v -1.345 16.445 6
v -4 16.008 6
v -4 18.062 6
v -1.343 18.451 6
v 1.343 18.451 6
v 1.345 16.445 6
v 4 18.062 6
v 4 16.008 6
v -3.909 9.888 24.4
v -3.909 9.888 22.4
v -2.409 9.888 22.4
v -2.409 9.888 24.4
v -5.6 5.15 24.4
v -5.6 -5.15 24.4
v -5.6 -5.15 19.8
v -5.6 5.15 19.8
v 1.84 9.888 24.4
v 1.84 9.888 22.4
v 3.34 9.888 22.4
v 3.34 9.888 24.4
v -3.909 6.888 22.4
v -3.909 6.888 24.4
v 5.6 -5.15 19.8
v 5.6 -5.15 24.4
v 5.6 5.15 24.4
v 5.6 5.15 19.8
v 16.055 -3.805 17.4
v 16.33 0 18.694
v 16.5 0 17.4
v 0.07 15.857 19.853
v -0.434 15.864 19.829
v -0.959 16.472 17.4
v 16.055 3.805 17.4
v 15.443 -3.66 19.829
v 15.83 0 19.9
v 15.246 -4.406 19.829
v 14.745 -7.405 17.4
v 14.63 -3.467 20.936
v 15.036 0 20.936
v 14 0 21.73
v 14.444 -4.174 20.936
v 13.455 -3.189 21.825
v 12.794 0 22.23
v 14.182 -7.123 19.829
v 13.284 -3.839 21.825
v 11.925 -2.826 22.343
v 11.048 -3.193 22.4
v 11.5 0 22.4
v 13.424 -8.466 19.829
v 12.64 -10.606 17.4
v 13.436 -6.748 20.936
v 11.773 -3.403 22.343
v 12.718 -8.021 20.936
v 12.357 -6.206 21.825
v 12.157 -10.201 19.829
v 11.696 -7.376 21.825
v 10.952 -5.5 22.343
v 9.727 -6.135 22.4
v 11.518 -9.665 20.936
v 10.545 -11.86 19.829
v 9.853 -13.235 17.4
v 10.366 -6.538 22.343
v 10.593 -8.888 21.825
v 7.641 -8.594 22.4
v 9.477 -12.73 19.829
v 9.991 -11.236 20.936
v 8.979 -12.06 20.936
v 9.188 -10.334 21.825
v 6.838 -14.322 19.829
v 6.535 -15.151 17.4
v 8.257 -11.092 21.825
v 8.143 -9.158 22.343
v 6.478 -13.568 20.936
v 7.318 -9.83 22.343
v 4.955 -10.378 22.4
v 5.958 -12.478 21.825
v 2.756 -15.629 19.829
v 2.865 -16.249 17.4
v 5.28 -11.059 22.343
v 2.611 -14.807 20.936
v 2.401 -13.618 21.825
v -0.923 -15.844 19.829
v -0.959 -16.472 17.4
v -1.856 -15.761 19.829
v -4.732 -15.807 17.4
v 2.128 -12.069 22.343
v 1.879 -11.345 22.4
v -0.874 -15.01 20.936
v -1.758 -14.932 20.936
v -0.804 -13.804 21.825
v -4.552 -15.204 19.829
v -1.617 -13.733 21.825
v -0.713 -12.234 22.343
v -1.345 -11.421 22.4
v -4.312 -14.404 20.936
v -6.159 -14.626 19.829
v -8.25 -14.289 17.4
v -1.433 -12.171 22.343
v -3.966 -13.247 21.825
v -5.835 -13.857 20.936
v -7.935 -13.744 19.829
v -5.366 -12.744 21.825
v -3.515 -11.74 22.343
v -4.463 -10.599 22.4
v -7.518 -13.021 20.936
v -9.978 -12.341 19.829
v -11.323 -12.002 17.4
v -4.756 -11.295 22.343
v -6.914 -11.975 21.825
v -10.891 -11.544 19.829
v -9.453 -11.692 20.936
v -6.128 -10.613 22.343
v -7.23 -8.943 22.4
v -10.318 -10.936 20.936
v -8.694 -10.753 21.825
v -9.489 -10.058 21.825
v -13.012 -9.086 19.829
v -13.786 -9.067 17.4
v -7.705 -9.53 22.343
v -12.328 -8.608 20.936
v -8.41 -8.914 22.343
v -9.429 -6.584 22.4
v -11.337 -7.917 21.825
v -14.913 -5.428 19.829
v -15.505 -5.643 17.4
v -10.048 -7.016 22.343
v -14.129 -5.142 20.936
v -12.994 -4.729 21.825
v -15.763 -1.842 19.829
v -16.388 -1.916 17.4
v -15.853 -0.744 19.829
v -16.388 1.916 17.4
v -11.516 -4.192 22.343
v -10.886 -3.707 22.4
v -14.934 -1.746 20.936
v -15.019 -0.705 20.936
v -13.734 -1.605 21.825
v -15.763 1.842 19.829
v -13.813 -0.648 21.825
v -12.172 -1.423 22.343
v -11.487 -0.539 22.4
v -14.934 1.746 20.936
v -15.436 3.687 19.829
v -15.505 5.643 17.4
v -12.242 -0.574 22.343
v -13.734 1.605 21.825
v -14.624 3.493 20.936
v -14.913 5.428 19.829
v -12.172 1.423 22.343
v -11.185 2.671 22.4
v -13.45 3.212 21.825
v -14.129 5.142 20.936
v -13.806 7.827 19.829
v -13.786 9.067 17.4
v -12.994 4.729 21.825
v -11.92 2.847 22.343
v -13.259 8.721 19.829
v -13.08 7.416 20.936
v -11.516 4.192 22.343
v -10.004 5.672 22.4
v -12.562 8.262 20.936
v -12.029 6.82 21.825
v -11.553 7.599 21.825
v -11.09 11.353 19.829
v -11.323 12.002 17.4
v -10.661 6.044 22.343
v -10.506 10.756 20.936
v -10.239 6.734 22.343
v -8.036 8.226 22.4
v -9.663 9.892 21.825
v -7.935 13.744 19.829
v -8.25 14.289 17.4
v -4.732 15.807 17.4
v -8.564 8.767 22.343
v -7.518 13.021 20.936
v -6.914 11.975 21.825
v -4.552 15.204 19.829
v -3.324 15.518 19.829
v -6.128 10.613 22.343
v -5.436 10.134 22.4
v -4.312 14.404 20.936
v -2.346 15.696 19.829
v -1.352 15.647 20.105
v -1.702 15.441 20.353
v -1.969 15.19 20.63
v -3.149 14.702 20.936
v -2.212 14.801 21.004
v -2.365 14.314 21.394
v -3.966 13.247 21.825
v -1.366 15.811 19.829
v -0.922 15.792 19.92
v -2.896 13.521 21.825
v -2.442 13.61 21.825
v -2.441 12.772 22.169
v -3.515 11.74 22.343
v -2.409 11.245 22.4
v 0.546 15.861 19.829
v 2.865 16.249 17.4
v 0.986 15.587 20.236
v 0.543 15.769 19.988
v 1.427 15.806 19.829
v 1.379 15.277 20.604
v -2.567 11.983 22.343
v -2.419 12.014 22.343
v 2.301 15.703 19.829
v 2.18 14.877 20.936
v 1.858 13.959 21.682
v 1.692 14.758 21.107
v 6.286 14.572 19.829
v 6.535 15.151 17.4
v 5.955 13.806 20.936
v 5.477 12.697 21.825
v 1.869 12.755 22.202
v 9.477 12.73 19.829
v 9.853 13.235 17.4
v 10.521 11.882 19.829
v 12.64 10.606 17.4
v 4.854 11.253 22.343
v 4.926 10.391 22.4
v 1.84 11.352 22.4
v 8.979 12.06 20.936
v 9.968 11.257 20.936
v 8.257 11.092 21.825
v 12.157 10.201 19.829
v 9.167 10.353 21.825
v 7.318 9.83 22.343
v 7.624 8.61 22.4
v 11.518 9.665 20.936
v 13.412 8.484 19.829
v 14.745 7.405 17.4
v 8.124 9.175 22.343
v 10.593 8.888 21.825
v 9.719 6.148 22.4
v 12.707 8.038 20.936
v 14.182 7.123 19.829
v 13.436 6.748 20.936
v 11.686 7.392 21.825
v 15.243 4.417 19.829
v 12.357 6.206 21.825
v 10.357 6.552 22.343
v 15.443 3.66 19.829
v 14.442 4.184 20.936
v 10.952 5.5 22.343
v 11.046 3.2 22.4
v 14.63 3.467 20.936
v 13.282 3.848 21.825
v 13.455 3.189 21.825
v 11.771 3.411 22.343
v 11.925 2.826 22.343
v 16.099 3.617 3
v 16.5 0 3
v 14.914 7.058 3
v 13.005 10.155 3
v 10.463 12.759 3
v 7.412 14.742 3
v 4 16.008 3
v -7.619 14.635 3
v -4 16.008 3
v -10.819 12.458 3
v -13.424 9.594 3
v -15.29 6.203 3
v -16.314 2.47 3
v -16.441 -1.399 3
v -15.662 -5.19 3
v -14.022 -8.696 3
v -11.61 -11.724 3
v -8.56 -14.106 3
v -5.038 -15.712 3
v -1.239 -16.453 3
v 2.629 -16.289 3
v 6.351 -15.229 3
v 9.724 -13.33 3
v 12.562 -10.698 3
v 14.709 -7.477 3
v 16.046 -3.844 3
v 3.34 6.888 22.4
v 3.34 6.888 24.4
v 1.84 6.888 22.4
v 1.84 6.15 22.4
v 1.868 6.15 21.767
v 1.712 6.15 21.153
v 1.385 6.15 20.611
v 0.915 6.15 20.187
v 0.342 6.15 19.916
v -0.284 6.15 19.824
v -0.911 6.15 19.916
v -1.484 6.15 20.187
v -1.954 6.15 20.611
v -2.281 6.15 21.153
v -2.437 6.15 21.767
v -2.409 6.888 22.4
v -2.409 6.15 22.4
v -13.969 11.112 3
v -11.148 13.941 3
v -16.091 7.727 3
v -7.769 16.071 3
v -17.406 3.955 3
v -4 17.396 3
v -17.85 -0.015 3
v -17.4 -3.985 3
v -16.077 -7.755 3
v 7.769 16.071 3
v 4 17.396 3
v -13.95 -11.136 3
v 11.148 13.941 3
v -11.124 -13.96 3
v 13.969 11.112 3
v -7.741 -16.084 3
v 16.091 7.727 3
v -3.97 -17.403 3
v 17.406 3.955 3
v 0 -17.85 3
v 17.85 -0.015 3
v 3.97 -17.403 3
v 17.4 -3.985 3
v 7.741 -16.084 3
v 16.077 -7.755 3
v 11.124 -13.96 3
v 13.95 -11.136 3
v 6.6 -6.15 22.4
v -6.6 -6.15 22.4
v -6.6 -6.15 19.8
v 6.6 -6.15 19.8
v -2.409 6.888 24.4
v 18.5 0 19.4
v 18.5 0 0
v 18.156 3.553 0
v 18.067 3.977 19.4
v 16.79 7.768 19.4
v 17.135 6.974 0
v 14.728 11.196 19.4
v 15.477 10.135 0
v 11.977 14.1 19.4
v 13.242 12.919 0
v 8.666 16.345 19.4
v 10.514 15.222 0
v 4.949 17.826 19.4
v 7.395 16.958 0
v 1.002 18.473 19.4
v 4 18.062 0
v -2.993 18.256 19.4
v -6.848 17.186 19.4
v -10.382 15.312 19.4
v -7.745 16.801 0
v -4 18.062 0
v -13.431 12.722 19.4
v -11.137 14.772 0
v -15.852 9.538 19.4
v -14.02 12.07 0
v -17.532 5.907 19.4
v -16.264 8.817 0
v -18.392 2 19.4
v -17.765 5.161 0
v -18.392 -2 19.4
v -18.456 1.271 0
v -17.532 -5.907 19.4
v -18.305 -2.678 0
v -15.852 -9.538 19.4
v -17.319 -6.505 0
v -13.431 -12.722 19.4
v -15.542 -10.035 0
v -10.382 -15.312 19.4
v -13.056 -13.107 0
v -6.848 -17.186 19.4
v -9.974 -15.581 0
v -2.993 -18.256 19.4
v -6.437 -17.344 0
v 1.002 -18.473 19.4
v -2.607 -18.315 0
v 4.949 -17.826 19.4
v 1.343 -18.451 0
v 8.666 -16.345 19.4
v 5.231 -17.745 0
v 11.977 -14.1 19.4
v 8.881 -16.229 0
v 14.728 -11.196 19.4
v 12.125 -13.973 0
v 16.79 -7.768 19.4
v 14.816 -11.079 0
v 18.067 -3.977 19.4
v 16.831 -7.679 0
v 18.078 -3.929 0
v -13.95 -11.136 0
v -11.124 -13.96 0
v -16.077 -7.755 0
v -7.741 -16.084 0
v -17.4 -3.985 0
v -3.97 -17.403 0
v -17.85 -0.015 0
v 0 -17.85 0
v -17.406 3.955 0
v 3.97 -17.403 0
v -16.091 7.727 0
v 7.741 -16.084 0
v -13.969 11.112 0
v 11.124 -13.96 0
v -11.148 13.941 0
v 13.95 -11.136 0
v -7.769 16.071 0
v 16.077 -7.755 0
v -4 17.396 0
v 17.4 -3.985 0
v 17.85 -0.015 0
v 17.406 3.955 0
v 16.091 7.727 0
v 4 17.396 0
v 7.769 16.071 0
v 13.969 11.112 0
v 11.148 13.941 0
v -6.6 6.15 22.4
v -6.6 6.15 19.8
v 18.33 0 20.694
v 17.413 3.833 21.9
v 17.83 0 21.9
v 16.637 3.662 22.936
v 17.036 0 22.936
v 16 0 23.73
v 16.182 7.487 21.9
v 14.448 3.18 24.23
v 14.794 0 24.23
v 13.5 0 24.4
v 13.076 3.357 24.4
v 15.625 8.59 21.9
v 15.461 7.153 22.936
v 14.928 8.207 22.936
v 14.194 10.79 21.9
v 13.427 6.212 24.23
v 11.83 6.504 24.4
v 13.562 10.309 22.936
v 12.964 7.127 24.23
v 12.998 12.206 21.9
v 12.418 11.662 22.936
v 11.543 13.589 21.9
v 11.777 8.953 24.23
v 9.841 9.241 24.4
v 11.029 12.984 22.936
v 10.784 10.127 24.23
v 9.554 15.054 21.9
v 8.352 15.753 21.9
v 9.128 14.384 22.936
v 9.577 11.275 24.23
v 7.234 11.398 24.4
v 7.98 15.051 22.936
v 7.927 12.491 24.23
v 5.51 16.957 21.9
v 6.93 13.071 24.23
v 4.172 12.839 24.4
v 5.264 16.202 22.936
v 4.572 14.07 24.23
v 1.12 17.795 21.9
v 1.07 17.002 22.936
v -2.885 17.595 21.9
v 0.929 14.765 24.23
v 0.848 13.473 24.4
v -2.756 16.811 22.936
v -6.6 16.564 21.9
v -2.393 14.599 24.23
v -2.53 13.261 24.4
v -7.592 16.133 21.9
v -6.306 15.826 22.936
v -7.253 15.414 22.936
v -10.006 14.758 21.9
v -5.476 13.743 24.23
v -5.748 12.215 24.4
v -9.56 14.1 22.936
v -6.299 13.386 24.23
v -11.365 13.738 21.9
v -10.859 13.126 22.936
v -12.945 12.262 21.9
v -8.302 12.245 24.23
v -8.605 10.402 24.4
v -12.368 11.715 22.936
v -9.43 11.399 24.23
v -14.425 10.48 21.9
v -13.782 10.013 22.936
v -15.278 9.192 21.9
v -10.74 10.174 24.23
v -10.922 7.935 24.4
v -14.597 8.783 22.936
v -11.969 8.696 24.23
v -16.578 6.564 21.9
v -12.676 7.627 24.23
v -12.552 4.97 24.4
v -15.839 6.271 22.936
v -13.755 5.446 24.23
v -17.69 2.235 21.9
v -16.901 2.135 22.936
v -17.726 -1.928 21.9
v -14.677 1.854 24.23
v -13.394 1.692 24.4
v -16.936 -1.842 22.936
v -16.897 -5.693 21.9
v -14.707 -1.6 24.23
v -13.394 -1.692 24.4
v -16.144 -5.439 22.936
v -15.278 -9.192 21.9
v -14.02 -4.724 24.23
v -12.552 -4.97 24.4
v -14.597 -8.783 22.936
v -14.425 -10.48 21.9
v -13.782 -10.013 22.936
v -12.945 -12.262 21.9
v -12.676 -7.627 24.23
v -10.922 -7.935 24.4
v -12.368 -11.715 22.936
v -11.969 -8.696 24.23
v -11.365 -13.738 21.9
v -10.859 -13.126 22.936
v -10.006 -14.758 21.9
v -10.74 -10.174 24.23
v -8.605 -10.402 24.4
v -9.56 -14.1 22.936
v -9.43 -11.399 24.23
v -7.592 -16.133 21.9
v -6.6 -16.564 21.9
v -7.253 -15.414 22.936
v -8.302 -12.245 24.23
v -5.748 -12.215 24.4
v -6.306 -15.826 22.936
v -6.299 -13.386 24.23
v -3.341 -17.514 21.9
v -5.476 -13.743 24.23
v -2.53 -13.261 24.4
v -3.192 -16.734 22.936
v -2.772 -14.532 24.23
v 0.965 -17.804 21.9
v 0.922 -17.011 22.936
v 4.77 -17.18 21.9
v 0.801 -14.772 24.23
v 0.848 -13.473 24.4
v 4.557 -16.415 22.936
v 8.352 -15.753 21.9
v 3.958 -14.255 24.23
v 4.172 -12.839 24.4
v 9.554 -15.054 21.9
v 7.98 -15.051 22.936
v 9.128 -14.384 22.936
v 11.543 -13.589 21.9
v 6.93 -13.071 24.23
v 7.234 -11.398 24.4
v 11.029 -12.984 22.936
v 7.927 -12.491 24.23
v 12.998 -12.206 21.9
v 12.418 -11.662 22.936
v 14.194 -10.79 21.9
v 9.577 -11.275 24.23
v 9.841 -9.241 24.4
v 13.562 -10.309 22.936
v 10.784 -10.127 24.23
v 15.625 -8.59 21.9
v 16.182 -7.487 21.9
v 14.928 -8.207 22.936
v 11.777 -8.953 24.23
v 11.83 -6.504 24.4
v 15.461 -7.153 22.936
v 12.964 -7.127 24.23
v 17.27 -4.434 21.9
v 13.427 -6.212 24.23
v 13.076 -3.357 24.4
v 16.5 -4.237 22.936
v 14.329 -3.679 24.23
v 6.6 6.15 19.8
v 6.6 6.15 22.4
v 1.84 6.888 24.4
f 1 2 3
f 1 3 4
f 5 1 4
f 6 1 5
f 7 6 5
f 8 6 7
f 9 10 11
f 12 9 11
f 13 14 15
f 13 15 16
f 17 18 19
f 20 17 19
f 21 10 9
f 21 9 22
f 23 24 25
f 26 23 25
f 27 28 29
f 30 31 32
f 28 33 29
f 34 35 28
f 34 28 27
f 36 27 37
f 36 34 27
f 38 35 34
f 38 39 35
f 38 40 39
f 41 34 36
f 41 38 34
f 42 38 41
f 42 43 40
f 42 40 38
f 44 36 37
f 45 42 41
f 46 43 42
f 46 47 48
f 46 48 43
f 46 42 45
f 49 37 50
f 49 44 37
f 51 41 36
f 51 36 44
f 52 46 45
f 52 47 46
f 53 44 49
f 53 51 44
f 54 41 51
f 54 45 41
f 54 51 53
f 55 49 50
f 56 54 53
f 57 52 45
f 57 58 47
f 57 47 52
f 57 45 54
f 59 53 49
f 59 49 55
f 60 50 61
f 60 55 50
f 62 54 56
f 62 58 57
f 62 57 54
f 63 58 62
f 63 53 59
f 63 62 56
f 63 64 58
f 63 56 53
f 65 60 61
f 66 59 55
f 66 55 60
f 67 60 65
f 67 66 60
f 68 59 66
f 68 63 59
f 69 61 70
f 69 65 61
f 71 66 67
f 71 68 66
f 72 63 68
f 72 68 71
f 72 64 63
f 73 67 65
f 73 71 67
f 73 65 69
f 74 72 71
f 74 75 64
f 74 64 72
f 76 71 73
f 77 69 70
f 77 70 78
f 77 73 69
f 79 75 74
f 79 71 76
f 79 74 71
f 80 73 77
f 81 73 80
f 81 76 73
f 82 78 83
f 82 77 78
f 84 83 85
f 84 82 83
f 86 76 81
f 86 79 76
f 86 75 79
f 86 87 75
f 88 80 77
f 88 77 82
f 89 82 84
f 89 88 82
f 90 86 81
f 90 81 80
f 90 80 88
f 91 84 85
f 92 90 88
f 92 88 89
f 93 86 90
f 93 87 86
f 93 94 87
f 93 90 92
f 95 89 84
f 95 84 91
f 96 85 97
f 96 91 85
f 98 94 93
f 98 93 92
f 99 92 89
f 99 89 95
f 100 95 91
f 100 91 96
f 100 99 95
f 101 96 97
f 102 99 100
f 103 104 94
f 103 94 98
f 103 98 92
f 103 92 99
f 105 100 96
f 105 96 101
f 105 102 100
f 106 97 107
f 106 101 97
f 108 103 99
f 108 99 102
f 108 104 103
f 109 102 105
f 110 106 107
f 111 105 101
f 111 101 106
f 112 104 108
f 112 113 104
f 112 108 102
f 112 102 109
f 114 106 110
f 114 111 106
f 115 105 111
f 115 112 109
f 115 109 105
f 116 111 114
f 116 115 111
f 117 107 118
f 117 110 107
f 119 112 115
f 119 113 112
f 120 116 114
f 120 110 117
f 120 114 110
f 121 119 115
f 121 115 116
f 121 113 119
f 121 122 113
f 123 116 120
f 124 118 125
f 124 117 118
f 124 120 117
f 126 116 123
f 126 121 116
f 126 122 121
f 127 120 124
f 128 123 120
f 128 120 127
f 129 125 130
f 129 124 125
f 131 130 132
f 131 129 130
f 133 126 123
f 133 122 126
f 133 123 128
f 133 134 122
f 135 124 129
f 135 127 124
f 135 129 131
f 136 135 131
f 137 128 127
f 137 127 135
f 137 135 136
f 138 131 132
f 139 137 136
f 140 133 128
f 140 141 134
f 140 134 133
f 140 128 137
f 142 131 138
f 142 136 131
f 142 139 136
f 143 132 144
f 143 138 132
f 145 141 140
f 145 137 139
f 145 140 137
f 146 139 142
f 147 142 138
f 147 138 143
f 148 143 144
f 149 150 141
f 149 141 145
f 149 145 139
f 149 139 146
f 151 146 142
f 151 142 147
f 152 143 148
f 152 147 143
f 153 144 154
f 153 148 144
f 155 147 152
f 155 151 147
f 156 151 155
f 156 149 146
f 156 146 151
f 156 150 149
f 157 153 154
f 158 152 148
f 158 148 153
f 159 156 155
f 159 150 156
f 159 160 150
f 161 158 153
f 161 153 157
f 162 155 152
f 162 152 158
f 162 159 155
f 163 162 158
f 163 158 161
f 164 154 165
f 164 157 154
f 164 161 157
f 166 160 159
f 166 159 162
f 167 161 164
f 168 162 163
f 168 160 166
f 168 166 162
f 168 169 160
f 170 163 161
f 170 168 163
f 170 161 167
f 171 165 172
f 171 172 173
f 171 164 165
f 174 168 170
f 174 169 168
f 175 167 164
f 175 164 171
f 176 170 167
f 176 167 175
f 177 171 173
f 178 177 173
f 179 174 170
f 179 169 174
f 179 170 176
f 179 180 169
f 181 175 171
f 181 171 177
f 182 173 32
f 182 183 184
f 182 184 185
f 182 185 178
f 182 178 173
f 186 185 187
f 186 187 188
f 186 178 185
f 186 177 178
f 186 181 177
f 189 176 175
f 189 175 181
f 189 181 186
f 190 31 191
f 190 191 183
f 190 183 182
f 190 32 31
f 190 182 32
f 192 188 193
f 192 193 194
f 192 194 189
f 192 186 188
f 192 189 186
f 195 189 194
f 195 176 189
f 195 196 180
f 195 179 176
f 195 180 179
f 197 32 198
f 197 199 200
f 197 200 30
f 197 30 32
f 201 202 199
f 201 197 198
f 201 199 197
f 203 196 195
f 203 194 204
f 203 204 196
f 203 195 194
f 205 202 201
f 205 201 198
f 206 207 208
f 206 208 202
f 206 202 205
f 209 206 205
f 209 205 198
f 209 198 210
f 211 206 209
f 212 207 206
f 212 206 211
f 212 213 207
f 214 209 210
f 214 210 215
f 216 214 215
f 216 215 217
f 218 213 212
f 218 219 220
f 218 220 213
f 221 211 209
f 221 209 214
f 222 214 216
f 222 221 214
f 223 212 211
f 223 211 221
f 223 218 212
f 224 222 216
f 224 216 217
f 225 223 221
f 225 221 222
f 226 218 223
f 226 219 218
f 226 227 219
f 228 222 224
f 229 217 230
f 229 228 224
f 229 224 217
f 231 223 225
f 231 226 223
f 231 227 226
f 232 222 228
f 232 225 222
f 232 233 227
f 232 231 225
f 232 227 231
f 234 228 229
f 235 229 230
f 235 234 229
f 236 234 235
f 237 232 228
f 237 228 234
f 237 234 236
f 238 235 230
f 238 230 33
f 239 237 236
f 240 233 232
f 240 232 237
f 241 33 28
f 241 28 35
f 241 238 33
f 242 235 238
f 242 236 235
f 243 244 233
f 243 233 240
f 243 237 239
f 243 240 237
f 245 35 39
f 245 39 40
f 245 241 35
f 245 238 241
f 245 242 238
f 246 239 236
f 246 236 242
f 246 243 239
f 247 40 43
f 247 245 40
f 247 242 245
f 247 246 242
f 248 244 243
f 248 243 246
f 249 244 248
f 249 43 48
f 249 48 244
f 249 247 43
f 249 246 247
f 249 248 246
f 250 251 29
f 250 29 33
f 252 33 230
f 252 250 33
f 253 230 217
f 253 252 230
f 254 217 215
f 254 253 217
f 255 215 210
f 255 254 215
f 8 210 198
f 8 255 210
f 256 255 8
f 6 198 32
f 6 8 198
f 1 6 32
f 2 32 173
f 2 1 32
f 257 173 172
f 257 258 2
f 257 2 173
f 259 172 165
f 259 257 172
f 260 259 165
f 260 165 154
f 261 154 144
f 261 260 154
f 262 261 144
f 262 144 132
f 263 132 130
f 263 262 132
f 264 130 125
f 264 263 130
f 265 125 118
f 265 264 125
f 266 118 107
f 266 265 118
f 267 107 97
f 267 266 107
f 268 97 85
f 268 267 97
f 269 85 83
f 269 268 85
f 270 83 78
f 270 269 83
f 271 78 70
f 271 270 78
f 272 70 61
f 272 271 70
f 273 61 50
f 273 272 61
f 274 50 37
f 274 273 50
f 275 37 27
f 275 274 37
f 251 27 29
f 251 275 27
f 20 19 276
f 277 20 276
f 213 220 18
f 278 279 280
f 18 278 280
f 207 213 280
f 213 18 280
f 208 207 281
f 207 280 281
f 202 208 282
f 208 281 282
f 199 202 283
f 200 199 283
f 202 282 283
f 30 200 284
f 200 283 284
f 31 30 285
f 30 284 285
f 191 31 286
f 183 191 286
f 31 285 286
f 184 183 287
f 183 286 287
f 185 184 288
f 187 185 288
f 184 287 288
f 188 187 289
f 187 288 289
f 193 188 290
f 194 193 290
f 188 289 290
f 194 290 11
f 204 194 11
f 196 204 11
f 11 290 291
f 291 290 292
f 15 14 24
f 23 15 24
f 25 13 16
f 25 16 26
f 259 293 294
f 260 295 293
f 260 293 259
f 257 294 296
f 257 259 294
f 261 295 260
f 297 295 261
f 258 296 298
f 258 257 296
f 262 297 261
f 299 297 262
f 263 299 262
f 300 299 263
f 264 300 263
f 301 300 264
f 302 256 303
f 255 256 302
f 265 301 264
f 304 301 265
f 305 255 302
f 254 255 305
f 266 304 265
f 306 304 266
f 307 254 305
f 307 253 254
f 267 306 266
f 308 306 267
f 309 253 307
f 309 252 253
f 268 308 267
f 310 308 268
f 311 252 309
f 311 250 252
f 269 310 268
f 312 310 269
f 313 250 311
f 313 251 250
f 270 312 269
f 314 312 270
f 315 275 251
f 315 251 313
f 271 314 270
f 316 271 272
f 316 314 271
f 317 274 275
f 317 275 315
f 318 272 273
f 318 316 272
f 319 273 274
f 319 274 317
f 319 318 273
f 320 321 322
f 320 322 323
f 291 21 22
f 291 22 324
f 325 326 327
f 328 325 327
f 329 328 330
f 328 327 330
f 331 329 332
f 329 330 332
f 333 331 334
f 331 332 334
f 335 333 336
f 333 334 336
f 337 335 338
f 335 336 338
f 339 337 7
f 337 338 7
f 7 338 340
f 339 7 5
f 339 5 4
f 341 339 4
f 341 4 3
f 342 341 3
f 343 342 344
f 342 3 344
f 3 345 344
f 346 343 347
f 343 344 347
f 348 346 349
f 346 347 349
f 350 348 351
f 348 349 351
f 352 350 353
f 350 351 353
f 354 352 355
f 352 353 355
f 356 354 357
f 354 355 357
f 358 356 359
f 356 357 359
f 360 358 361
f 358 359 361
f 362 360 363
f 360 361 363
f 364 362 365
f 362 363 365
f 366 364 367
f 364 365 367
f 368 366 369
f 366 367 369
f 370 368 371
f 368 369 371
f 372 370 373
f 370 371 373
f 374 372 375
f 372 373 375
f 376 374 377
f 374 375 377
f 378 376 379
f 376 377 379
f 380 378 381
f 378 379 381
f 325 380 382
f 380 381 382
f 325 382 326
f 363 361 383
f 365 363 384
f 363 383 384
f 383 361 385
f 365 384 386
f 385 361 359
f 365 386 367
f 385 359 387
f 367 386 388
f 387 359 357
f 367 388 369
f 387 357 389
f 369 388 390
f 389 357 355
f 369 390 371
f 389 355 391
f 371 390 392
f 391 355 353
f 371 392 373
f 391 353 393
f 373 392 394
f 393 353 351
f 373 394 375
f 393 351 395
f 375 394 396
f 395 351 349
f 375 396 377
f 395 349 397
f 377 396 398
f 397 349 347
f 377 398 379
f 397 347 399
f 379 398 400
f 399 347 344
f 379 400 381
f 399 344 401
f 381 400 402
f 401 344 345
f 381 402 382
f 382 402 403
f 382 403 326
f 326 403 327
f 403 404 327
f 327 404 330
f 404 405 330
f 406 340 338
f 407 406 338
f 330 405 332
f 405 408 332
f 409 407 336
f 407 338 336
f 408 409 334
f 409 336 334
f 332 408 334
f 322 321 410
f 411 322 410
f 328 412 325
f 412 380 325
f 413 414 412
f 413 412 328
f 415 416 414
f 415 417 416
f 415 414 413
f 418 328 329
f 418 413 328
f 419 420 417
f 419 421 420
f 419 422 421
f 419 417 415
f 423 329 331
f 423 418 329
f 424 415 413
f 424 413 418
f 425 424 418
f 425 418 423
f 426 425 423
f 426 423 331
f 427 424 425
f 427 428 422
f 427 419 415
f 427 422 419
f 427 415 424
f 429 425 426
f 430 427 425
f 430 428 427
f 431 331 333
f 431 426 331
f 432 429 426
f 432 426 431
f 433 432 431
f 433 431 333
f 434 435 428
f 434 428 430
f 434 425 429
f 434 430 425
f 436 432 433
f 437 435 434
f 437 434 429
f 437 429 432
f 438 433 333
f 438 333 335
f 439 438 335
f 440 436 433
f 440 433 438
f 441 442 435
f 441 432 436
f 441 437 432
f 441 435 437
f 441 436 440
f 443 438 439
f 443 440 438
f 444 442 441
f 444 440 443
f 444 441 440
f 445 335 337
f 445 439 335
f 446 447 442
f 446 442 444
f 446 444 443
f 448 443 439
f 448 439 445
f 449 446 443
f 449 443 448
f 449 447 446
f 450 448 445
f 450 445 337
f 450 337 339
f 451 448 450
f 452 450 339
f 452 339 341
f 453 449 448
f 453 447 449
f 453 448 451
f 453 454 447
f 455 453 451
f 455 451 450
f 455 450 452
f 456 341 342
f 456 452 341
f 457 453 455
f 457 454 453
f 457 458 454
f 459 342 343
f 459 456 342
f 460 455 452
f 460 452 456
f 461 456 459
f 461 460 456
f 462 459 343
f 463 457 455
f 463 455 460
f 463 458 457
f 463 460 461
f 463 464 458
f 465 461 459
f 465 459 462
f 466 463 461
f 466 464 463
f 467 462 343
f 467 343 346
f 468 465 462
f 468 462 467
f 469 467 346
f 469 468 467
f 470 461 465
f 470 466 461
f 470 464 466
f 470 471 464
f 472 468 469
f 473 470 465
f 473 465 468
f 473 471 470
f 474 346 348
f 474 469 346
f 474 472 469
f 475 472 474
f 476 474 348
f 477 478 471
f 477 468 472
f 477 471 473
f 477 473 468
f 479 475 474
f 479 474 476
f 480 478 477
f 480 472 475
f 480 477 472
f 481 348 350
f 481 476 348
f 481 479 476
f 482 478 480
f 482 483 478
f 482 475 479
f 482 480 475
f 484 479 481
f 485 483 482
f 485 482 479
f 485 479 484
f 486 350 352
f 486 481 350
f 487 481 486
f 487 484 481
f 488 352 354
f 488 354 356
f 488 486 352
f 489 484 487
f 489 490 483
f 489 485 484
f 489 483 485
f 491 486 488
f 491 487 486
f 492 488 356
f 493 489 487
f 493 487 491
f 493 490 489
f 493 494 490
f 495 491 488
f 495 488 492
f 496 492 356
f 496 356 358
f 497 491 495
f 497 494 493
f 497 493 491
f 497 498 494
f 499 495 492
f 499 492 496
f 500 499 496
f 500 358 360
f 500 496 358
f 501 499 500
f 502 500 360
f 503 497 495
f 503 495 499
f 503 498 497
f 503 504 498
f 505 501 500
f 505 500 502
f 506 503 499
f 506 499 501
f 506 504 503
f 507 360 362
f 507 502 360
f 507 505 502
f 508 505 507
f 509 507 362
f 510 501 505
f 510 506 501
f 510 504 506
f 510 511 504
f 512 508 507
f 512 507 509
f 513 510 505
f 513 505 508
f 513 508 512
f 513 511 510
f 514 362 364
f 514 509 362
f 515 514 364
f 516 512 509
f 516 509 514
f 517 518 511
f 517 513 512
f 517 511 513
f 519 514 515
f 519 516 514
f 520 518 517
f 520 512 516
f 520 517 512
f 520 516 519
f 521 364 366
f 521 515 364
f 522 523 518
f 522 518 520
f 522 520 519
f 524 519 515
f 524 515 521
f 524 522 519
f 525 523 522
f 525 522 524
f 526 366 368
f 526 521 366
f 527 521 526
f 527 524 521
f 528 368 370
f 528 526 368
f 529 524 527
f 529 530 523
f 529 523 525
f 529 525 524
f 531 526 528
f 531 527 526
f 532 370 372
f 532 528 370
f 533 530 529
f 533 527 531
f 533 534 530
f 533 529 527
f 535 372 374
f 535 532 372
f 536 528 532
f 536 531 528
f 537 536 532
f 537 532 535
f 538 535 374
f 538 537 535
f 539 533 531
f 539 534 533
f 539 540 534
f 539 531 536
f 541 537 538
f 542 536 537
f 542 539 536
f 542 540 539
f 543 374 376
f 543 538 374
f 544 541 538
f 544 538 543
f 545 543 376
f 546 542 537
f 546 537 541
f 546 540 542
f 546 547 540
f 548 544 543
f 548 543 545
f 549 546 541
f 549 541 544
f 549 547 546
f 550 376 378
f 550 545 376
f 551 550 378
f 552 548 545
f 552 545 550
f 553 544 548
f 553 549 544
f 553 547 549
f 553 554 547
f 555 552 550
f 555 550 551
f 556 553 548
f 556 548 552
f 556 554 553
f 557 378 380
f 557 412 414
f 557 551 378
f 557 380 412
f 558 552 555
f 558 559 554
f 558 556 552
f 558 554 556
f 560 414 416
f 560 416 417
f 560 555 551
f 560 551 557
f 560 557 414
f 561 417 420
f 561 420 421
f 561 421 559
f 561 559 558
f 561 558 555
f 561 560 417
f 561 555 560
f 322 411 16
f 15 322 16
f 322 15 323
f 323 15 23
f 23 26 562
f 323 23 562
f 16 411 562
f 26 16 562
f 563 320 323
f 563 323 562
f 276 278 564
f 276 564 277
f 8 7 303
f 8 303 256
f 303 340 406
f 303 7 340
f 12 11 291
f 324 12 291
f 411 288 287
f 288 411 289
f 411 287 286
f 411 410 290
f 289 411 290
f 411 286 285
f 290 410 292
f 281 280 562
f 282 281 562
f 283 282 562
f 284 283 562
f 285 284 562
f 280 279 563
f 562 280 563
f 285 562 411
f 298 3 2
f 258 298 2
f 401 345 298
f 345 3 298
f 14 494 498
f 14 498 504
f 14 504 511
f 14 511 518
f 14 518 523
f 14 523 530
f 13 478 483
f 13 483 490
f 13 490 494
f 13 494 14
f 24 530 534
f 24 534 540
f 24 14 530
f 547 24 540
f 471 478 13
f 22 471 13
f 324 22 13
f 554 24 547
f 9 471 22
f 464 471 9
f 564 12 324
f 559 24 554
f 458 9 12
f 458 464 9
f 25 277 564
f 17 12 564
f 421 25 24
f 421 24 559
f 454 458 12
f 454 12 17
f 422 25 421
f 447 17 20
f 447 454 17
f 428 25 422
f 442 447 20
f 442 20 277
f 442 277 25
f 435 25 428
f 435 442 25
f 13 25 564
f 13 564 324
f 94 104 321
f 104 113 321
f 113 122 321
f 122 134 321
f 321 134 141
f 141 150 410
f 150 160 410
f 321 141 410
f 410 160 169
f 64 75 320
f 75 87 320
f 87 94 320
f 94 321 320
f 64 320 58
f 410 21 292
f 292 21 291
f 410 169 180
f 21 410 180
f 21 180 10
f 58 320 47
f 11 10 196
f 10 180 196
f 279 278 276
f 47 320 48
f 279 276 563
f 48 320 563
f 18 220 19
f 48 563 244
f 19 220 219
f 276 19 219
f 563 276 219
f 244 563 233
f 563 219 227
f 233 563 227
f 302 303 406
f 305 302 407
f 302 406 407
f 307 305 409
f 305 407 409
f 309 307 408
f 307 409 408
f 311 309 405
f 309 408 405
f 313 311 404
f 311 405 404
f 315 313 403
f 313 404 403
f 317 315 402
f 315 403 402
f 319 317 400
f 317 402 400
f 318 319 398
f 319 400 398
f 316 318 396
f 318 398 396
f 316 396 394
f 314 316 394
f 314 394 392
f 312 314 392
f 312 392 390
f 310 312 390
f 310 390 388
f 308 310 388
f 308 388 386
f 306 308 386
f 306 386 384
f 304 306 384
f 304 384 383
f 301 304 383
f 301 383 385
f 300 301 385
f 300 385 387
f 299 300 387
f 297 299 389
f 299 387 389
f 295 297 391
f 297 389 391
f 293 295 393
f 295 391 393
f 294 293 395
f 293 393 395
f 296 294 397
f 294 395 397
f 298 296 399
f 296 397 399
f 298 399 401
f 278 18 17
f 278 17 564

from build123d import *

# Parameters (mm, degrees)
F0_R      = 18.5
F1_DEPTH  = 24.4
F2_T      = -2
F3_R      = 5
F4_R      = 5
F5_W      = 11.2
F5_H      = 10.3
F6_DEPTH  = 25
F7_W      = 8
F7_H      = 32.8909642994
F8_DEPTH  = 6
F9_R      = 17.85
F10_DEPTH = 3
F5_W_2    = 13.2
F5_H_2    = 12.3
F11_DEPTH = 4.6
F13_DEPTH = 10
F14_W     = 1.5
F14_H     = 3
F15_DEPTH = 25


with BuildPart() as f1:
    # F0 (on Top) → F1 (new body)
    with BuildSketch(Plane.XY):
        Circle(F0_R)
    extrude(amount=F1_DEPTH)

    # F2
    f2_openings = [f1.faces().sort_by_distance(p)[0] for p in [
        (0, 0, 0),
    ]]
    offset(amount=F2_T, openings=f2_openings)

    # F3
    f3_edges = [f1.edges().sort_by_distance(p)[0] for p in [
        (-16.5, 0, 22.4),
    ]]
    fillet(f3_edges, radius=F3_R)

    # F4
    f4_edges = [f1.edges().sort_by_distance(p)[0] for p in [
        (-18.5, 0, 24.4),
    ]]
    fillet(f4_edges, radius=F4_R)

    # F5 (on face) → F6 (cut)
    with BuildSketch(Plane.XY.offset(24.4)):
        Rectangle(F5_W, F5_H)
    extrude(amount=-F6_DEPTH, mode=Mode.SUBTRACT)

    # F7 (on face) → F8 (cut)
    with BuildSketch(Plane(origin=(0, 0, 0), x_dir=(1, 0, 0), z_dir=(0, 0, -1))):
        with Locations((0, -3.944914788)):
            Rectangle(F7_W, F7_H)
    extrude(amount=-F8_DEPTH, mode=Mode.SUBTRACT)

    # F9 (on face) + F7 (on face) → F10 (cut)
    with BuildSketch(Plane(origin=(0, 0, 0), x_dir=(1, 0, 0), z_dir=(0, 0, -1))):
        Circle(F9_R)
    with BuildSketch(Plane(origin=(0, 0, 0), x_dir=(1, 0, 0), z_dir=(0, 0, -1))):
        with Locations((0, -3.944914788)):
            Rectangle(F7_W, F7_H)
    extrude(amount=-F10_DEPTH, mode=Mode.SUBTRACT)

    # F5 (on face) → F11 (join)
    with BuildSketch(Plane.XY.offset(24.4)):
        Rectangle(F5_W_2, F5_H_2)
        Rectangle(F5_W, F5_H, mode=Mode.SUBTRACT)
    extrude(amount=-F11_DEPTH)

    # F12 (on face) → F13 (join)
    with BuildSketch(Plane(origin=(0, 6.15, 0), x_dir=(-1, 0, 0), z_dir=(0, 1, 0))):
        with BuildLine():
            Line((2.4086248595, 22.4), (-1.8398975953, 22.4))
            ThreePointArc((-1.8398975953, 22.4), (0.2843636321, 19.8238066567), (2.4086248595, 22.4))
        make_face()
    extrude(amount=F13_DEPTH)

    # F14 (on face) → F15 (cut)
    with BuildSketch(Plane(origin=(0, 0, 22.4), x_dir=(1, 0, 0), z_dir=(0, 0, -1))):
        with Locations((-3.1586248595, -8.3878219724)):
            Rectangle(F14_W, F14_H)
        with Locations((2.5898975953, -8.3878219724)):
            Rectangle(F14_W, F14_H)
    extrude(amount=-F15_DEPTH, mode=Mode.SUBTRACT)


solid = f1.part
